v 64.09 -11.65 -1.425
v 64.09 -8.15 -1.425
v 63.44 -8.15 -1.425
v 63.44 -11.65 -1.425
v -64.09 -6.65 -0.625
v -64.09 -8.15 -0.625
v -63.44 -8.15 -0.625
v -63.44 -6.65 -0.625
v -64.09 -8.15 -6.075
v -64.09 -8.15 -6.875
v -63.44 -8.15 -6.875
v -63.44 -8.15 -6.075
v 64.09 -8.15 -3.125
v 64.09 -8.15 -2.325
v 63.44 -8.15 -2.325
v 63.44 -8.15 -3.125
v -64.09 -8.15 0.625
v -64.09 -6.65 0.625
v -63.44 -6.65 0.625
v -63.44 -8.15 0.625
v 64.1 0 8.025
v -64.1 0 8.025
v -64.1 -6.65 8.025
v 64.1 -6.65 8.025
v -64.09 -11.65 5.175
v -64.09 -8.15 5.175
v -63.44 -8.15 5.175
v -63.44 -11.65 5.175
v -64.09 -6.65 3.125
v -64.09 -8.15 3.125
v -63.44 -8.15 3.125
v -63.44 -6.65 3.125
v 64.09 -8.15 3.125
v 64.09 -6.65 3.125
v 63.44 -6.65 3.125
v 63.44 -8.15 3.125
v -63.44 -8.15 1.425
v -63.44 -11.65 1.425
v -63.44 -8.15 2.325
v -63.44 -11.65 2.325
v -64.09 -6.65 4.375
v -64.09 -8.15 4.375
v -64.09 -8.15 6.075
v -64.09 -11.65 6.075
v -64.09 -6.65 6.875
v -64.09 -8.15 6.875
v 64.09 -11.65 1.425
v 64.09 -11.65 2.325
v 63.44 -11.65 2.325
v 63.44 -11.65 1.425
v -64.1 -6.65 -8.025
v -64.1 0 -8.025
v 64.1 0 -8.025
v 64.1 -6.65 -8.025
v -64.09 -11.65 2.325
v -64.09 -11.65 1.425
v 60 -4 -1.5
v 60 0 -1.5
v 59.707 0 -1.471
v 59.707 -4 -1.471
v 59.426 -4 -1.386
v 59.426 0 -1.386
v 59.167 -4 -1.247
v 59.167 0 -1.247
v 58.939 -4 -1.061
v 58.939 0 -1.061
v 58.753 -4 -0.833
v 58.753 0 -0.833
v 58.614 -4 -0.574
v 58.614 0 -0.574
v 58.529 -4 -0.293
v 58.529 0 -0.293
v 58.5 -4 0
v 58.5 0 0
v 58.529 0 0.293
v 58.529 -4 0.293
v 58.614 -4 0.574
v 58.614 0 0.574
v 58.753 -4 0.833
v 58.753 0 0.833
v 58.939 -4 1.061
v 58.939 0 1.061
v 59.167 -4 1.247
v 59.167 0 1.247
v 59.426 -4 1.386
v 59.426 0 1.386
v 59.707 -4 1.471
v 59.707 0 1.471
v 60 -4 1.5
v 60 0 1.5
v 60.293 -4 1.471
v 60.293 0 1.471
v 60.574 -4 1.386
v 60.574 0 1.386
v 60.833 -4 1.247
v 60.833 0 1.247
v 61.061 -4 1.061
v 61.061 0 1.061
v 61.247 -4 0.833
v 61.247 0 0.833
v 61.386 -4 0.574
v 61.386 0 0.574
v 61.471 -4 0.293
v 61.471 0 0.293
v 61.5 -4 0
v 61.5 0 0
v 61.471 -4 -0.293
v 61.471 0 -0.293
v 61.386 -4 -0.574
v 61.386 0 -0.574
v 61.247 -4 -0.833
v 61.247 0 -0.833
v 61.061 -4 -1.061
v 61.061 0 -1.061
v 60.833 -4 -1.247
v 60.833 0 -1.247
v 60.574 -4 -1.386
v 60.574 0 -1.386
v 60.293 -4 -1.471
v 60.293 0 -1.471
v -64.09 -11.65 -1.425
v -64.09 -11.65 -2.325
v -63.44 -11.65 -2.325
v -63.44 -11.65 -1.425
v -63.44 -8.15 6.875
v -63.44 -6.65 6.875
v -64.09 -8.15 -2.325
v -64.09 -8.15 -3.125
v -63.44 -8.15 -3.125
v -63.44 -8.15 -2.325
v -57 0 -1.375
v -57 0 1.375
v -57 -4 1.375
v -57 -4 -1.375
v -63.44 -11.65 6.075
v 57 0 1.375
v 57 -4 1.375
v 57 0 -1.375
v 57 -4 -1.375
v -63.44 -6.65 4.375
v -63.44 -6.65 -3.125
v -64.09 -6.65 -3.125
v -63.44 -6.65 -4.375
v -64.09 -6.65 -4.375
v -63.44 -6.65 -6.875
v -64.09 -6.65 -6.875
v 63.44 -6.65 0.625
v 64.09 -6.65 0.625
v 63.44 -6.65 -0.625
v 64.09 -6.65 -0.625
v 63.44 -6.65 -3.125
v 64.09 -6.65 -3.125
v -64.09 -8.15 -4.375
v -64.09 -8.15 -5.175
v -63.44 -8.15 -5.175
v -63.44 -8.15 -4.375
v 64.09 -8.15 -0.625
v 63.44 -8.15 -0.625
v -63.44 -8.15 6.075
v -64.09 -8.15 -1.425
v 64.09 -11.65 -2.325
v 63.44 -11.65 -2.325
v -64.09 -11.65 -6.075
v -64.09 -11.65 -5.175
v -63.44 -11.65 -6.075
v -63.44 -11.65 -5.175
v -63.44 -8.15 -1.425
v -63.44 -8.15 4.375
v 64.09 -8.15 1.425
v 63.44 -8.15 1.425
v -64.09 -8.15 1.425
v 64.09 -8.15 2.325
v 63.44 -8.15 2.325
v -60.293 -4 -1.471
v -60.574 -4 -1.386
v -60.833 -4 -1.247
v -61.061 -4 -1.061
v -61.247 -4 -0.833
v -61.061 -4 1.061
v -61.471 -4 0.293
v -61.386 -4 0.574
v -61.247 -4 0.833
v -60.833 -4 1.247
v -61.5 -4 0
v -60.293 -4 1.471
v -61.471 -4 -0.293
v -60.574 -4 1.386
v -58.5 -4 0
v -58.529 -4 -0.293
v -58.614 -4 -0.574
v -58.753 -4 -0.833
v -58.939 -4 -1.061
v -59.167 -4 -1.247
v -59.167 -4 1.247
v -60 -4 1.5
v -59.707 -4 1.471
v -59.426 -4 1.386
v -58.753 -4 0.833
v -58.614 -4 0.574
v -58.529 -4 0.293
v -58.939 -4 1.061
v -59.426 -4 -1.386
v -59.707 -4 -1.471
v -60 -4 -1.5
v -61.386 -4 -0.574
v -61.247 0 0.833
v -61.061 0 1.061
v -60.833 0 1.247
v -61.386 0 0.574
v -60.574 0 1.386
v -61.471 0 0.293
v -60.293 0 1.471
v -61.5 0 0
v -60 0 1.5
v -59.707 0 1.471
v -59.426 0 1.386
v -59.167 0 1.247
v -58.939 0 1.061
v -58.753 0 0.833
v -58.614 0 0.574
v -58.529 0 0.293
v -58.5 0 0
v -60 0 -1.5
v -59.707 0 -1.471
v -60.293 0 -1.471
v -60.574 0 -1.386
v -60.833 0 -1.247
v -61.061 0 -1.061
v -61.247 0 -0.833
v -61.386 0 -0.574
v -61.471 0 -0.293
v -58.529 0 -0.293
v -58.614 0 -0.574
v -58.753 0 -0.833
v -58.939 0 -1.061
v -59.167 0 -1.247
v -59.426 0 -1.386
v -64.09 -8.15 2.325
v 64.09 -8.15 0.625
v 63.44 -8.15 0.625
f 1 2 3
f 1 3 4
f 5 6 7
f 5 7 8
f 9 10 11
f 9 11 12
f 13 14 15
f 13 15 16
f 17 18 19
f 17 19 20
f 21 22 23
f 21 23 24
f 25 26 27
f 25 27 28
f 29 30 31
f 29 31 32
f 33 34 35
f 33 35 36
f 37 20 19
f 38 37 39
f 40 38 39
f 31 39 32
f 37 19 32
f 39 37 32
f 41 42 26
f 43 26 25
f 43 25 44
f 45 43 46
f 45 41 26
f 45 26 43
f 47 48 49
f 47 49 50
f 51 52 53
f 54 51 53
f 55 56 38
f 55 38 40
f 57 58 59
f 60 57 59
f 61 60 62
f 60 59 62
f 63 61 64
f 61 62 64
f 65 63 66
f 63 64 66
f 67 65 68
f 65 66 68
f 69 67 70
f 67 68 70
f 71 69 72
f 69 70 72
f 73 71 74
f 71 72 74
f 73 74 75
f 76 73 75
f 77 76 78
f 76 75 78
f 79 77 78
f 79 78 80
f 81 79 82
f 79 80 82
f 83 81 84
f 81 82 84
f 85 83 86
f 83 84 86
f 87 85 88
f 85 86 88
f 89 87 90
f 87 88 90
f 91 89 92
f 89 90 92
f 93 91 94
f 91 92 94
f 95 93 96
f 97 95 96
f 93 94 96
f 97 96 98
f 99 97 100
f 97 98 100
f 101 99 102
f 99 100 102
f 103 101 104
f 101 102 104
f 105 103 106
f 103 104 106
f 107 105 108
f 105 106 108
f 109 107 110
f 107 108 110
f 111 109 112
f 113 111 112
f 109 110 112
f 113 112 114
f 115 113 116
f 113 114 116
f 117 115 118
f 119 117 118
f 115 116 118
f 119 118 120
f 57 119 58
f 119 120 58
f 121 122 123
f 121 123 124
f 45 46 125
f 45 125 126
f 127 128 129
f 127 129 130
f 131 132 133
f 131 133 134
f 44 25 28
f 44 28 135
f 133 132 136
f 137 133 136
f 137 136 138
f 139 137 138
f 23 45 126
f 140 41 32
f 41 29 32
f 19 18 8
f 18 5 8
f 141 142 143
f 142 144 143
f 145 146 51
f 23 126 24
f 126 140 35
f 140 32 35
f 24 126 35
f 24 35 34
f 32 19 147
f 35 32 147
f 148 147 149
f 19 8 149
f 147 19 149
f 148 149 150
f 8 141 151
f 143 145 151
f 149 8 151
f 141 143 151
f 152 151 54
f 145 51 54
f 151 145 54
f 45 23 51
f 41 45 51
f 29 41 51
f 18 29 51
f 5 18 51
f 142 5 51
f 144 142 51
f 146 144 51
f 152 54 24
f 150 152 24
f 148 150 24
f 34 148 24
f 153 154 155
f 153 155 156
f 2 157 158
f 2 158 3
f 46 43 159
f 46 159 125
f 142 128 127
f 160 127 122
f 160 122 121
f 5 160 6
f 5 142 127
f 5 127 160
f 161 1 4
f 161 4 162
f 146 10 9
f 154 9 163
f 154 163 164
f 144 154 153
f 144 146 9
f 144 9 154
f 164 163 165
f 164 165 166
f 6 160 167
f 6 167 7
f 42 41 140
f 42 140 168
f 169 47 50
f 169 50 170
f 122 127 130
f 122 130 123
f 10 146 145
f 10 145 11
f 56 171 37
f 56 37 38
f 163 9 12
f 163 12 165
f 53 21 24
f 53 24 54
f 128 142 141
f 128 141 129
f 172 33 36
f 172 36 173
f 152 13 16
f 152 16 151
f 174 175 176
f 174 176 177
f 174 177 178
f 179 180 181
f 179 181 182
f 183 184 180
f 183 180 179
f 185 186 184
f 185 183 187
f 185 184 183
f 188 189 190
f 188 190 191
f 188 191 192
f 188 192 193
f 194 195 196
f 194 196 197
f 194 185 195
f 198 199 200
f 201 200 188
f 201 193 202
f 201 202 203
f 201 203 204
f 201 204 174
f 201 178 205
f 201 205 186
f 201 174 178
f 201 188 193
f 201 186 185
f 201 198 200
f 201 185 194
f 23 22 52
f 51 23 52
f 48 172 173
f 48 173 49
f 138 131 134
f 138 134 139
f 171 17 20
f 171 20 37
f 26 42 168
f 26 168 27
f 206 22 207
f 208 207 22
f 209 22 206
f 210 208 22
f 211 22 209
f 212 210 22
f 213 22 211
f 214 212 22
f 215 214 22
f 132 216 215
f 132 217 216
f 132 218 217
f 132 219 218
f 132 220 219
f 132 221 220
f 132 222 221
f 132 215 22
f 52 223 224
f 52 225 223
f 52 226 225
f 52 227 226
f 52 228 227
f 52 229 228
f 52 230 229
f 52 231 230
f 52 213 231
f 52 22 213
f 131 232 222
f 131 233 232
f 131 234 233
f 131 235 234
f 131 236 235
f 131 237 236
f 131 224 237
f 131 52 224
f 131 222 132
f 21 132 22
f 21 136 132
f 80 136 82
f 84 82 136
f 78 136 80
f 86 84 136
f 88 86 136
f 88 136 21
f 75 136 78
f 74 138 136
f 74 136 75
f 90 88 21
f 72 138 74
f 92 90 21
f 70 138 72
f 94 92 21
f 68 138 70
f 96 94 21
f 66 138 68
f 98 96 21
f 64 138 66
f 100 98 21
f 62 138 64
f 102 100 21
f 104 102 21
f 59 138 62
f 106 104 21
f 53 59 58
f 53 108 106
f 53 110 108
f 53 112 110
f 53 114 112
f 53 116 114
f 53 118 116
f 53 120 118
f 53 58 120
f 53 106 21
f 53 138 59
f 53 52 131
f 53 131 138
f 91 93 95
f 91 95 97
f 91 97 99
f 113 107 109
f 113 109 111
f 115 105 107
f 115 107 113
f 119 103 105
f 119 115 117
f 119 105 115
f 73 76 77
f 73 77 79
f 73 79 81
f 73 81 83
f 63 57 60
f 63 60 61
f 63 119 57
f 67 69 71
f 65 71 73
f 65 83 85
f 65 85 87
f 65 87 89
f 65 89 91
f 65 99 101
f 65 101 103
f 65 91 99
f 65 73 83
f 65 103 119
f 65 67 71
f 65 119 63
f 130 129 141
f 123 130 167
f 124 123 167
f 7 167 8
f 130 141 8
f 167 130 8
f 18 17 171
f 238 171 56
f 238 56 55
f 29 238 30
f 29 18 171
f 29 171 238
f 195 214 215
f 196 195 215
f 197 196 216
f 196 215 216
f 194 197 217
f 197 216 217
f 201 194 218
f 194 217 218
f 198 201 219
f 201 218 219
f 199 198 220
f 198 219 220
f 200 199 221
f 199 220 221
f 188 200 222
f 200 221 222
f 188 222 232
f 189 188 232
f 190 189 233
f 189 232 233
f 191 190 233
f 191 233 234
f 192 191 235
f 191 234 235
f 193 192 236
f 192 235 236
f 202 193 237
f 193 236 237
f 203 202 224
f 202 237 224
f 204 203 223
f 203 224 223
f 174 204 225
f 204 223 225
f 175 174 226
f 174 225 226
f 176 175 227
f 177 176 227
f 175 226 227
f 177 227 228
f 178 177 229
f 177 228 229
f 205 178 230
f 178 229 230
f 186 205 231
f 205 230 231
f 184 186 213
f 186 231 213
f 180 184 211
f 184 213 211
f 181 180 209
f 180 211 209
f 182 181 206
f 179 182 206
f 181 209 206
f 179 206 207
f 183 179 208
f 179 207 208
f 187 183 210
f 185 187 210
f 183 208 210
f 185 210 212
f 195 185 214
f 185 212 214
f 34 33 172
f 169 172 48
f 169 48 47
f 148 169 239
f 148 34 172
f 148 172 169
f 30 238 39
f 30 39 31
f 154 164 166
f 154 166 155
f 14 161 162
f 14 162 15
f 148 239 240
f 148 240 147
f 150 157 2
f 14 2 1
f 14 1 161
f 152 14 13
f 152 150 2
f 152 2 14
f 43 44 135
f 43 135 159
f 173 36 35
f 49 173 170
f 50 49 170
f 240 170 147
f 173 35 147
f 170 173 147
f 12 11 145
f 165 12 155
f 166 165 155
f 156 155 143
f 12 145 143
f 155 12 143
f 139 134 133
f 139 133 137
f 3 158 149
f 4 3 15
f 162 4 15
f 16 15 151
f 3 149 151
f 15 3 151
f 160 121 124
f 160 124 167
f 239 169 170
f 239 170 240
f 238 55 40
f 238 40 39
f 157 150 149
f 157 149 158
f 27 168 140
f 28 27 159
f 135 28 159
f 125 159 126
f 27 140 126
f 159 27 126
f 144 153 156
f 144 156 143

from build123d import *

# Parameters (mm, degrees)
SKETCH1_W           = 128.2
SKETCH1_H           = 16.05
BOSS_EXTRUDE1_DEPTH = 6.65
SKETCH2_R           = 1.5
SKETCH2_W           = 114
SKETCH2_H           = 2.75
CUT_EXTRUDE1_DEPTH  = 4
BOSS_EXTRUDE2_DEPTH = 0.65
BOSS_EXTRUDE3_DEPTH = 0.65


with BuildPart() as part:
    # Sketch1 → Boss-Extrude1 (new body)
    with BuildSketch(Plane(origin=(0, 0, 0), x_dir=(1, 0, 0), z_dir=(0, 1, 0))):
        Rectangle(SKETCH1_W, SKETCH1_H)
    extrude(amount=-BOSS_EXTRUDE1_DEPTH)

    # Sketch2 → Cut-Extrude1 (cut)
    with BuildSketch(Plane(origin=(0, 0, 0), x_dir=(1, 0, 0), z_dir=(0, 1, 0))):
        with Locations(Location((-60, 0, 0), (0, 0, 270))):
            Circle(SKETCH2_R)
        with Locations(Location((60, 0, 0), (0, 0, 90))):
            Circle(SKETCH2_R)
        Rectangle(SKETCH2_W, SKETCH2_H)
    extrude(amount=-CUT_EXTRUDE1_DEPTH, mode=Mode.SUBTRACT)

    # Sketch3 → Boss-Extrude2 (add)
    with BuildSketch(Plane.ZY.offset(64.09)):
        Polygon((-6.875, -6.65), (-6.875, -8.15), (-6.075, -8.15), (-6.075, -11.65), (-5.175, -11.65), (-5.175, -8.15), (-4.375, -8.15), (-4.375, -6.65), align=None)
        Polygon((-0.625, -6.65), (-3.125, -6.65), (-3.125, -8.15), (-2.325, -8.15), (-2.325, -11.65), (-1.425, -11.65), (-1.425, -8.15), (-0.625, -8.15), align=None)
        Polygon((3.125, -6.65), (0.625, -6.65), (0.625, -8.15), (1.425, -8.15), (1.425, -11.65), (2.325, -11.65), (2.325, -8.15), (3.125, -8.15), align=None)
        Polygon((6.875, -6.65), (4.375, -6.65), (4.375, -8.15), (5.175, -8.15), (5.175, -11.65), (6.075, -11.65), (6.075, -8.15), (6.875, -8.15), align=None)
    extrude(amount=-BOSS_EXTRUDE2_DEPTH)

    # Sketch4 → Boss-Extrude3 (add)
    with BuildSketch(Plane(origin=(64.09, 0, 0), x_dir=(0, 0, -1), z_dir=(1, 0, 0))):
        Polygon((-0.625, -8.15), (-0.625, -6.65), (-3.125, -6.65), (-3.125, -8.15), (-2.325, -8.15), (-2.325, -11.65), (-1.425, -11.65), (-1.425, -8.15), align=None)
        Polygon((3.125, -8.15), (3.125, -6.65), (0.625, -6.65), (0.625, -8.15), (1.425, -8.15), (1.425, -11.65), (2.325, -11.65), (2.325, -8.15), align=None)
    extrude(amount=-BOSS_EXTRUDE3_DEPTH)


solid = part.part
